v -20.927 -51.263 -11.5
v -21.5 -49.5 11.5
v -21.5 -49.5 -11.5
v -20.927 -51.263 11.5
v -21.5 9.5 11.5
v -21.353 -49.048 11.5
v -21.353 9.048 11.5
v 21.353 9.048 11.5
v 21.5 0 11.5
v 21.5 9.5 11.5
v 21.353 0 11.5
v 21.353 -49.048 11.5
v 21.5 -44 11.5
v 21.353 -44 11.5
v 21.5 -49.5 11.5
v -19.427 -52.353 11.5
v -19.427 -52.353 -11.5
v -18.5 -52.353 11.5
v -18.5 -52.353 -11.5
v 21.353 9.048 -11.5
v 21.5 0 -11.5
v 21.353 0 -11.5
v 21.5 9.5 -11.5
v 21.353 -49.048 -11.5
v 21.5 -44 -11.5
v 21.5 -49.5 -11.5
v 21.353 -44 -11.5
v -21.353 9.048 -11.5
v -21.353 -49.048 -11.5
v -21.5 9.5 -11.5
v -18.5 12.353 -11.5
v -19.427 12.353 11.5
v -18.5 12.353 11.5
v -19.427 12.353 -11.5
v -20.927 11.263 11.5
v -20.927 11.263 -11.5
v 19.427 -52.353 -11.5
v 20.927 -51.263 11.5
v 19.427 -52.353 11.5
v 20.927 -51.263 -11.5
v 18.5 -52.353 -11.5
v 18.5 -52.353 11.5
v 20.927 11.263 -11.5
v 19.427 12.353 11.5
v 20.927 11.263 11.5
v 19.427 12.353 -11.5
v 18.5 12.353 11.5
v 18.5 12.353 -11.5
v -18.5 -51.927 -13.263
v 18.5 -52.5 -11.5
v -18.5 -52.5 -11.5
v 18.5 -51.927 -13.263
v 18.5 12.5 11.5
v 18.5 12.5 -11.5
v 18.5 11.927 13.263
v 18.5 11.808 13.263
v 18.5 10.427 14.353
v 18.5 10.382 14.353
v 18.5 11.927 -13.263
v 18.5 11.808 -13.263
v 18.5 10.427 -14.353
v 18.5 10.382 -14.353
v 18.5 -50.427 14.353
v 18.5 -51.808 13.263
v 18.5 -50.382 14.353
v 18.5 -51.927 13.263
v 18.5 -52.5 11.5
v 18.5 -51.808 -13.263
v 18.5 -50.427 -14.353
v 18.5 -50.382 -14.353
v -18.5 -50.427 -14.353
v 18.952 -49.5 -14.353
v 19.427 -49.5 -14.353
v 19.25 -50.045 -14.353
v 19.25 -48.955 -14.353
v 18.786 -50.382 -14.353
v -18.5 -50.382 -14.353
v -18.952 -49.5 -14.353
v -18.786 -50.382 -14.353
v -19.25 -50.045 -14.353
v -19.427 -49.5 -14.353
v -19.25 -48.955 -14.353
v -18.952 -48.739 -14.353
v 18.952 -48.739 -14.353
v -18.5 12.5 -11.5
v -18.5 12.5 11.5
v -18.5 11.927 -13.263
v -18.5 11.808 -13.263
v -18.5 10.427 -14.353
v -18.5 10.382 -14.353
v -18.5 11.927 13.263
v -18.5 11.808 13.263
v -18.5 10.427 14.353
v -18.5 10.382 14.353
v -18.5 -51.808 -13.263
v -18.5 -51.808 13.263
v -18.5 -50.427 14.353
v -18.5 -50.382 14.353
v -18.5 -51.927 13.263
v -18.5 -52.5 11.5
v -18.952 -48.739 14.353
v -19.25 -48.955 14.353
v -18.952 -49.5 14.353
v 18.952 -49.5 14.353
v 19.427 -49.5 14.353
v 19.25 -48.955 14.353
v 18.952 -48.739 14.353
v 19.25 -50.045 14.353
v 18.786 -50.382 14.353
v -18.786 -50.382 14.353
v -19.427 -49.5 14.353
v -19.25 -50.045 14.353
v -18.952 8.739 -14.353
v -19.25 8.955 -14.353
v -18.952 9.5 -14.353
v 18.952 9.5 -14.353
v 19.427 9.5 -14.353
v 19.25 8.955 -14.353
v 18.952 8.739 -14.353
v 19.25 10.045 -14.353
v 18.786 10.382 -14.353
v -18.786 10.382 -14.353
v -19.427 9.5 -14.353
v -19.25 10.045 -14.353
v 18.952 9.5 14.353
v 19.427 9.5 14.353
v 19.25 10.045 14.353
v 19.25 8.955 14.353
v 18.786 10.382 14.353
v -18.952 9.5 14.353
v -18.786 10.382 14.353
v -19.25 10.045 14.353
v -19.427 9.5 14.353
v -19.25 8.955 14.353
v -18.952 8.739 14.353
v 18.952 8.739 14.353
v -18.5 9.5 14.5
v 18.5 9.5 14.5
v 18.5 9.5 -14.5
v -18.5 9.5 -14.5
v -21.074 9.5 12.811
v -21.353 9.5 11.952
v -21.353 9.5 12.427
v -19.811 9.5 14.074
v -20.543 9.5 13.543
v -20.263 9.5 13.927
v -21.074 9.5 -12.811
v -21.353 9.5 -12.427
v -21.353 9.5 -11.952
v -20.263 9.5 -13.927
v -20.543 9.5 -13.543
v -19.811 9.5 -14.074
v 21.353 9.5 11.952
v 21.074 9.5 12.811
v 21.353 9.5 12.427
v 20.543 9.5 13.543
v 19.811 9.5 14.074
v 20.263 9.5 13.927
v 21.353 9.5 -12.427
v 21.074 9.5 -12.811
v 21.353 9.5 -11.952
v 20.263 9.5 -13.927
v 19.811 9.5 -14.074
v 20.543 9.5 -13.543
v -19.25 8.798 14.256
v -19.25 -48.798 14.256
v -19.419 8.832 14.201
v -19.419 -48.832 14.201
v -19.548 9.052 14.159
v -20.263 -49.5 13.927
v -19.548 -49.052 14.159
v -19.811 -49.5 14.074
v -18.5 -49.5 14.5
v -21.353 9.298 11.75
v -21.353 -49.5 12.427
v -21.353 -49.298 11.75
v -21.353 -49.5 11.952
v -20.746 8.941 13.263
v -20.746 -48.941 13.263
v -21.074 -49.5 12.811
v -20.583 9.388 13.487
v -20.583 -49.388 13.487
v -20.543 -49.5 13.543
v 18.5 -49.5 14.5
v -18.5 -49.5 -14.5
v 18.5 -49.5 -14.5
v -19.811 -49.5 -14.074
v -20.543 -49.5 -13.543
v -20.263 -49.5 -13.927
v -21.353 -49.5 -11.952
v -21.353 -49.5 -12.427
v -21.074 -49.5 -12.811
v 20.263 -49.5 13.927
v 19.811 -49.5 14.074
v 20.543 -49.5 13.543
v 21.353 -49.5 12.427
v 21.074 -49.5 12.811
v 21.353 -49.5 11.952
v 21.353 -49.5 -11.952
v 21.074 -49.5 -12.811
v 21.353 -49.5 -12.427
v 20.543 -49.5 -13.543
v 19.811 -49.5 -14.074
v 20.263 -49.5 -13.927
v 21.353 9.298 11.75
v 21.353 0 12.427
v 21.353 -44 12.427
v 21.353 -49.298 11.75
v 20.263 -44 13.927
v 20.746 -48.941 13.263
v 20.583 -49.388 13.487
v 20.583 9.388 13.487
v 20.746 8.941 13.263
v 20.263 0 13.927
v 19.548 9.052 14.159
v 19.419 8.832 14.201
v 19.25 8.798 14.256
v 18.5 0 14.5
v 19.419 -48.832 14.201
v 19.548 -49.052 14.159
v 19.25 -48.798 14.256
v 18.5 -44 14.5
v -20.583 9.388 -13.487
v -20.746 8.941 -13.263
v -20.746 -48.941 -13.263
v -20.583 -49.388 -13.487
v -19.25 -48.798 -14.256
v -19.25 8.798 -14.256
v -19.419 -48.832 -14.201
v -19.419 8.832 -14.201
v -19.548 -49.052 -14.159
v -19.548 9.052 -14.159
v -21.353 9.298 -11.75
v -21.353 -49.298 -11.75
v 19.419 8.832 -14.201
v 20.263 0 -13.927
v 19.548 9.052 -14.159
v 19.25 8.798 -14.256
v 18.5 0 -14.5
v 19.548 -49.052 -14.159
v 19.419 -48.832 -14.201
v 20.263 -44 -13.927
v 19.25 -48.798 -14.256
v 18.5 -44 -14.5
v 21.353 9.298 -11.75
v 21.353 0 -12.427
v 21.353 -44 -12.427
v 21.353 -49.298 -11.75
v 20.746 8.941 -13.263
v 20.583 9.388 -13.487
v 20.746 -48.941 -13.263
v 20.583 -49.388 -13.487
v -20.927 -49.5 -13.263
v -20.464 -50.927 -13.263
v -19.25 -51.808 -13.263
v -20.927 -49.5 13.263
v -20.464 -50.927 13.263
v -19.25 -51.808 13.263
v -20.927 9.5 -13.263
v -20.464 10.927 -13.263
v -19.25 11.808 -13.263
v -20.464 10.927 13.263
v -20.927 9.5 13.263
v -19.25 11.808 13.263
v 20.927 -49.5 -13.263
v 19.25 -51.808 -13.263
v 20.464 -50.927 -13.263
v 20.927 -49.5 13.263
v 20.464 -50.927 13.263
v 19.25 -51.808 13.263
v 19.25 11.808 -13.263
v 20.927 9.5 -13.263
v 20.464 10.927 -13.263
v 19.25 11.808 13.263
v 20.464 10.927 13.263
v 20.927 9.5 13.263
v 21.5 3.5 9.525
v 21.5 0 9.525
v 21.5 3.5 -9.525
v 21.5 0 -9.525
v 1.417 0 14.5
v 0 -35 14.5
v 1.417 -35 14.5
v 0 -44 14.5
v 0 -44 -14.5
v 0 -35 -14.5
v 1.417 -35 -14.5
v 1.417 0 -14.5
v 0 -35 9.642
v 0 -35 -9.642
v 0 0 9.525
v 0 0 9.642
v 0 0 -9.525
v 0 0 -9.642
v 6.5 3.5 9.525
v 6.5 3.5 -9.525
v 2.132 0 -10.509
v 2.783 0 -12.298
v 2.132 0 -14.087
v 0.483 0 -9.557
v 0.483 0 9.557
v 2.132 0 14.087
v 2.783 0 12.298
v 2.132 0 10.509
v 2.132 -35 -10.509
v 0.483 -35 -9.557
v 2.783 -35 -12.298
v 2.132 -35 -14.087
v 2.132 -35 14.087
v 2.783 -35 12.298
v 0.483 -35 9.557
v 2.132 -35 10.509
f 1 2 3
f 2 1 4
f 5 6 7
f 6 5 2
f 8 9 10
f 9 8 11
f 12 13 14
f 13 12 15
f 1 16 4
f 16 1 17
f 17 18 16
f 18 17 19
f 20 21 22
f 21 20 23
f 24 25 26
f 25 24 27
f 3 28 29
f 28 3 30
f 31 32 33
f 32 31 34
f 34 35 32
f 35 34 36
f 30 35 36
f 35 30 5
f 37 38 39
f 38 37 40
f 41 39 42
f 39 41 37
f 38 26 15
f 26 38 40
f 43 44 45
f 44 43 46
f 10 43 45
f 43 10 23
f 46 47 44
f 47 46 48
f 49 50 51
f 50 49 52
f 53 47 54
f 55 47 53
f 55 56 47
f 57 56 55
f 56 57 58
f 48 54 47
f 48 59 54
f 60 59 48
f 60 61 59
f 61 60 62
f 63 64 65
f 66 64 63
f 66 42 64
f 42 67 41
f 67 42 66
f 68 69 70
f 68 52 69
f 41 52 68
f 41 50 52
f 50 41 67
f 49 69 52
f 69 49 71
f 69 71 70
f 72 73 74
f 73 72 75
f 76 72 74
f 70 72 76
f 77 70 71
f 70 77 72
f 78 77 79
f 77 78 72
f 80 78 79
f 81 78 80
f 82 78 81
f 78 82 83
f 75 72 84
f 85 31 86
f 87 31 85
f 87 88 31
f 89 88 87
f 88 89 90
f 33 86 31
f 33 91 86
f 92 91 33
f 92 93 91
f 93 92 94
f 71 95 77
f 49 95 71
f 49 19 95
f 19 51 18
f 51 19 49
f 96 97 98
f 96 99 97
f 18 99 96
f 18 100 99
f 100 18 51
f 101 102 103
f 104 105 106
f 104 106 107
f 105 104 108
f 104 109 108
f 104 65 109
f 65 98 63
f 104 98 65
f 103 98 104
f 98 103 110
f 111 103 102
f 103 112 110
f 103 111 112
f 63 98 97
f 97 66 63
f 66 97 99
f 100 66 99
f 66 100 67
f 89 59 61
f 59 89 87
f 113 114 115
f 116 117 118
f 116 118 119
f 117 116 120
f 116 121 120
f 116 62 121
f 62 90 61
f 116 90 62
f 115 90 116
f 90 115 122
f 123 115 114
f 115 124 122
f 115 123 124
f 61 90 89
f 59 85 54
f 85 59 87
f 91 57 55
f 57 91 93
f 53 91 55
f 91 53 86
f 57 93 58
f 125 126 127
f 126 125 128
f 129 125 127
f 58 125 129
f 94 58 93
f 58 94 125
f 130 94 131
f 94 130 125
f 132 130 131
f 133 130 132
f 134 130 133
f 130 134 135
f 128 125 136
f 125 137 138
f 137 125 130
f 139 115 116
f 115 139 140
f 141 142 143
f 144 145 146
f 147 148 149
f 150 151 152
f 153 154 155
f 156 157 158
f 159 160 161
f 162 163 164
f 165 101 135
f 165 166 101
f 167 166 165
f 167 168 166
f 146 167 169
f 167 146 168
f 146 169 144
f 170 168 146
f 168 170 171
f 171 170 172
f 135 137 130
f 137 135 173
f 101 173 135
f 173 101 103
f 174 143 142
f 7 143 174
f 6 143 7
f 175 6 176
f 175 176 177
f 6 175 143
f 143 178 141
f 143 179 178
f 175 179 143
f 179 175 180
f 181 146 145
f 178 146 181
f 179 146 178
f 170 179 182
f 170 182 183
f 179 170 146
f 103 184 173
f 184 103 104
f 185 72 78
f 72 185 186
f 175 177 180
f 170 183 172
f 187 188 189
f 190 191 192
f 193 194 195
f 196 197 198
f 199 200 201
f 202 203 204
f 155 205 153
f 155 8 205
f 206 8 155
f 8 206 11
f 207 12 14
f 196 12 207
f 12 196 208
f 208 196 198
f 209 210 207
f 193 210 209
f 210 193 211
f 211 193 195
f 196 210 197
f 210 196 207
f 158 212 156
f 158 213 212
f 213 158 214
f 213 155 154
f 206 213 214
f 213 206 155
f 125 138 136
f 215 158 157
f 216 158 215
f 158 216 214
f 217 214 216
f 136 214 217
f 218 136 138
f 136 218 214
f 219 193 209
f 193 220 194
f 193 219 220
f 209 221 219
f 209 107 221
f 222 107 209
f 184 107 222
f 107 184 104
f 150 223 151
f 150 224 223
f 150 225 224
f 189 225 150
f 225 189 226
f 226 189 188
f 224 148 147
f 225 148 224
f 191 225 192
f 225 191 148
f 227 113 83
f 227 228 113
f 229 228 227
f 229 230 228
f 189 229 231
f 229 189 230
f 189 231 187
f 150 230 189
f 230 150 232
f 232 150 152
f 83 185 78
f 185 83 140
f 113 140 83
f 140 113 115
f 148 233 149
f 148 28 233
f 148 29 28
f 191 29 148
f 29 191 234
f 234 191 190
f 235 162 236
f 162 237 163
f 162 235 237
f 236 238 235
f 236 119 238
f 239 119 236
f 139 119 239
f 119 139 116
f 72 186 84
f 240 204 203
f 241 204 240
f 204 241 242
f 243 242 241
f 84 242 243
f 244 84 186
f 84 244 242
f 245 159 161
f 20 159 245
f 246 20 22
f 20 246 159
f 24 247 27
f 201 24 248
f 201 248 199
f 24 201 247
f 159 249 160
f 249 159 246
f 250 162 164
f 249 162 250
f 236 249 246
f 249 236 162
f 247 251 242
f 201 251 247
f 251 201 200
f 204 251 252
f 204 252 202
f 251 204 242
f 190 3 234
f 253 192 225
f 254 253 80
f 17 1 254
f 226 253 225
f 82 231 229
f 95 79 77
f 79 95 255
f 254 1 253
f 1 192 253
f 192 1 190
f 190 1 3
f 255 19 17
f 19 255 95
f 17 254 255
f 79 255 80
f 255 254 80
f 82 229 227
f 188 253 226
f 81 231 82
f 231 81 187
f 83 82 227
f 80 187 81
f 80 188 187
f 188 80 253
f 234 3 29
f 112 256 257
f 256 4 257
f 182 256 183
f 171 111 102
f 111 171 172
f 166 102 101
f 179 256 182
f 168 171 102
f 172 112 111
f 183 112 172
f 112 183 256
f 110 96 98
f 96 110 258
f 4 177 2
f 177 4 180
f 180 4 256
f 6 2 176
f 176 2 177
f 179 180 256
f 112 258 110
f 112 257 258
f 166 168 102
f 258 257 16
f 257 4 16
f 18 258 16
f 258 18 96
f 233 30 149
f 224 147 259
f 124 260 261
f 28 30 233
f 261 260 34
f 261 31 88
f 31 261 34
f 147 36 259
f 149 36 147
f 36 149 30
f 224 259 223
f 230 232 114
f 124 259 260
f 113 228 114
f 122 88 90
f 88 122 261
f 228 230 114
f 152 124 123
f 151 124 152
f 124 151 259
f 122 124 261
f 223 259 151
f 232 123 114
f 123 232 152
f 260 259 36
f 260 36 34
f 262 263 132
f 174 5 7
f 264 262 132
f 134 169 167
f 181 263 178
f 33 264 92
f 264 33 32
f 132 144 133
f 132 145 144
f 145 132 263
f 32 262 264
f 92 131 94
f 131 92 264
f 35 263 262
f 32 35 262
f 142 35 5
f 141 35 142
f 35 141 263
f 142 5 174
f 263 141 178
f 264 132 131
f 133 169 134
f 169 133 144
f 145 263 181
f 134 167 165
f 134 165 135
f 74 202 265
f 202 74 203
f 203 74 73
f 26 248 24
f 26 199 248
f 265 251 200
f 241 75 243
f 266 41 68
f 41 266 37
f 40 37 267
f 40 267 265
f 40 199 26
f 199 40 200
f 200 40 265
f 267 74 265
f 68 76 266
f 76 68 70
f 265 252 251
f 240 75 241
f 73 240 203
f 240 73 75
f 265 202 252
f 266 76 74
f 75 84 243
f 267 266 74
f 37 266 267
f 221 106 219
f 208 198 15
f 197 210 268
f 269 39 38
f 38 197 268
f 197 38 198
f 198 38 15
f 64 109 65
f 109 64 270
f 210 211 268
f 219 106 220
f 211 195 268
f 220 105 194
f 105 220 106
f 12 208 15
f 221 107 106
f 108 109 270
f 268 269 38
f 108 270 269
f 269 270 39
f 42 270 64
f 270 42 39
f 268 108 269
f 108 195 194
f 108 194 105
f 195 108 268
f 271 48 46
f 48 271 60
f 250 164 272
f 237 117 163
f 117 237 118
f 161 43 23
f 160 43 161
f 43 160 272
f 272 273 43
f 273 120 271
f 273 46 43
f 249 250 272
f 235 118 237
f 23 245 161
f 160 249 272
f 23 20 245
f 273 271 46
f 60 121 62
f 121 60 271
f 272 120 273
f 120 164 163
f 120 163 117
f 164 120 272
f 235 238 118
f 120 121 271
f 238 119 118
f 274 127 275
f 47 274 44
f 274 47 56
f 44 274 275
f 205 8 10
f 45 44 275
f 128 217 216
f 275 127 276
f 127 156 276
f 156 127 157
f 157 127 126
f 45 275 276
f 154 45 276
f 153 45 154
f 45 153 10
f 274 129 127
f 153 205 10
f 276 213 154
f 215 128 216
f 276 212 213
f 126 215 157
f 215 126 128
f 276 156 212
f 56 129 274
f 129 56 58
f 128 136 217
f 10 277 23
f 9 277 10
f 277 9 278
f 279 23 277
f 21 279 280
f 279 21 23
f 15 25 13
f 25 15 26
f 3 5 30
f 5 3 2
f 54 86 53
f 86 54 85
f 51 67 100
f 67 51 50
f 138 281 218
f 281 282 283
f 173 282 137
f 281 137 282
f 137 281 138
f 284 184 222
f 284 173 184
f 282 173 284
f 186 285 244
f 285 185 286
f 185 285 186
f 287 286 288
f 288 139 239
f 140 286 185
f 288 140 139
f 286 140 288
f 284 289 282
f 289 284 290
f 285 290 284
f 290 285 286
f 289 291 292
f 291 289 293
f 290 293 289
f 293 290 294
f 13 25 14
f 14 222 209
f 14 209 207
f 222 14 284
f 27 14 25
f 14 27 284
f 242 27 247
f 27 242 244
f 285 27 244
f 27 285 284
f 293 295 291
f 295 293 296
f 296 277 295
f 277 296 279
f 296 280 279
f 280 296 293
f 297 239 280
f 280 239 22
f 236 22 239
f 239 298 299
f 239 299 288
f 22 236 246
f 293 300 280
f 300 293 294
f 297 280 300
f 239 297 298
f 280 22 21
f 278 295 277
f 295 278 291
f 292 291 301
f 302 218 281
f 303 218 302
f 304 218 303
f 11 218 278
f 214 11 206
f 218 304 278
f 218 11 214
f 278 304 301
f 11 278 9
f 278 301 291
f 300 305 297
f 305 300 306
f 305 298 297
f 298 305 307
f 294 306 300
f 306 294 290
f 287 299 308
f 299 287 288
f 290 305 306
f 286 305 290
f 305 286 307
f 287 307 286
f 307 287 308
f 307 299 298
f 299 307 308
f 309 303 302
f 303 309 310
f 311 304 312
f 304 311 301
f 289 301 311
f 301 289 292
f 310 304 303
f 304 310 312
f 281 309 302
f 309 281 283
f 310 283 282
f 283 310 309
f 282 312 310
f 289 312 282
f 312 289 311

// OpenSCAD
include <MCAD/boxes.scad>

module discToCentral() {

	pWidth=40.9375;
	pLength=36.275;
	
	difference() {
		translate([0,-20,0]) {
			//cube([43,65,29],center=true);
			roundedBox([43,65,29],3,false);
		}
	
		
		union() {
			difference() {	
				linear_extrude(height=36.275, center=true) {
					polygon(
						points=[[0,0],[6.5,3.5],[26.5,3.5],[40.9375,-3.5],[40.9375,-44],[0,-44]],
						paths=[[0,1,2,3,4,5]]);
				}
			
			
			//The two top grooves
				translate([0,0,-15.08125]) cube([21.5,5.55625,5.55625]);
				translate([0,0,9.525]) cube([21.5,5.55625,5.55625]);
			
			//The two front cylindrical grooves
				translate([0,10,-12.298125]) rotate([90,0,0]) cylinder(h=45,r=2.783125);
				translate([0,10,12.298125]) rotate([90,0,0]) cylinder(h=45,r=2.783125);
				translate([0,-3,0]);
			}
		}
	}
}

discToCentral();
